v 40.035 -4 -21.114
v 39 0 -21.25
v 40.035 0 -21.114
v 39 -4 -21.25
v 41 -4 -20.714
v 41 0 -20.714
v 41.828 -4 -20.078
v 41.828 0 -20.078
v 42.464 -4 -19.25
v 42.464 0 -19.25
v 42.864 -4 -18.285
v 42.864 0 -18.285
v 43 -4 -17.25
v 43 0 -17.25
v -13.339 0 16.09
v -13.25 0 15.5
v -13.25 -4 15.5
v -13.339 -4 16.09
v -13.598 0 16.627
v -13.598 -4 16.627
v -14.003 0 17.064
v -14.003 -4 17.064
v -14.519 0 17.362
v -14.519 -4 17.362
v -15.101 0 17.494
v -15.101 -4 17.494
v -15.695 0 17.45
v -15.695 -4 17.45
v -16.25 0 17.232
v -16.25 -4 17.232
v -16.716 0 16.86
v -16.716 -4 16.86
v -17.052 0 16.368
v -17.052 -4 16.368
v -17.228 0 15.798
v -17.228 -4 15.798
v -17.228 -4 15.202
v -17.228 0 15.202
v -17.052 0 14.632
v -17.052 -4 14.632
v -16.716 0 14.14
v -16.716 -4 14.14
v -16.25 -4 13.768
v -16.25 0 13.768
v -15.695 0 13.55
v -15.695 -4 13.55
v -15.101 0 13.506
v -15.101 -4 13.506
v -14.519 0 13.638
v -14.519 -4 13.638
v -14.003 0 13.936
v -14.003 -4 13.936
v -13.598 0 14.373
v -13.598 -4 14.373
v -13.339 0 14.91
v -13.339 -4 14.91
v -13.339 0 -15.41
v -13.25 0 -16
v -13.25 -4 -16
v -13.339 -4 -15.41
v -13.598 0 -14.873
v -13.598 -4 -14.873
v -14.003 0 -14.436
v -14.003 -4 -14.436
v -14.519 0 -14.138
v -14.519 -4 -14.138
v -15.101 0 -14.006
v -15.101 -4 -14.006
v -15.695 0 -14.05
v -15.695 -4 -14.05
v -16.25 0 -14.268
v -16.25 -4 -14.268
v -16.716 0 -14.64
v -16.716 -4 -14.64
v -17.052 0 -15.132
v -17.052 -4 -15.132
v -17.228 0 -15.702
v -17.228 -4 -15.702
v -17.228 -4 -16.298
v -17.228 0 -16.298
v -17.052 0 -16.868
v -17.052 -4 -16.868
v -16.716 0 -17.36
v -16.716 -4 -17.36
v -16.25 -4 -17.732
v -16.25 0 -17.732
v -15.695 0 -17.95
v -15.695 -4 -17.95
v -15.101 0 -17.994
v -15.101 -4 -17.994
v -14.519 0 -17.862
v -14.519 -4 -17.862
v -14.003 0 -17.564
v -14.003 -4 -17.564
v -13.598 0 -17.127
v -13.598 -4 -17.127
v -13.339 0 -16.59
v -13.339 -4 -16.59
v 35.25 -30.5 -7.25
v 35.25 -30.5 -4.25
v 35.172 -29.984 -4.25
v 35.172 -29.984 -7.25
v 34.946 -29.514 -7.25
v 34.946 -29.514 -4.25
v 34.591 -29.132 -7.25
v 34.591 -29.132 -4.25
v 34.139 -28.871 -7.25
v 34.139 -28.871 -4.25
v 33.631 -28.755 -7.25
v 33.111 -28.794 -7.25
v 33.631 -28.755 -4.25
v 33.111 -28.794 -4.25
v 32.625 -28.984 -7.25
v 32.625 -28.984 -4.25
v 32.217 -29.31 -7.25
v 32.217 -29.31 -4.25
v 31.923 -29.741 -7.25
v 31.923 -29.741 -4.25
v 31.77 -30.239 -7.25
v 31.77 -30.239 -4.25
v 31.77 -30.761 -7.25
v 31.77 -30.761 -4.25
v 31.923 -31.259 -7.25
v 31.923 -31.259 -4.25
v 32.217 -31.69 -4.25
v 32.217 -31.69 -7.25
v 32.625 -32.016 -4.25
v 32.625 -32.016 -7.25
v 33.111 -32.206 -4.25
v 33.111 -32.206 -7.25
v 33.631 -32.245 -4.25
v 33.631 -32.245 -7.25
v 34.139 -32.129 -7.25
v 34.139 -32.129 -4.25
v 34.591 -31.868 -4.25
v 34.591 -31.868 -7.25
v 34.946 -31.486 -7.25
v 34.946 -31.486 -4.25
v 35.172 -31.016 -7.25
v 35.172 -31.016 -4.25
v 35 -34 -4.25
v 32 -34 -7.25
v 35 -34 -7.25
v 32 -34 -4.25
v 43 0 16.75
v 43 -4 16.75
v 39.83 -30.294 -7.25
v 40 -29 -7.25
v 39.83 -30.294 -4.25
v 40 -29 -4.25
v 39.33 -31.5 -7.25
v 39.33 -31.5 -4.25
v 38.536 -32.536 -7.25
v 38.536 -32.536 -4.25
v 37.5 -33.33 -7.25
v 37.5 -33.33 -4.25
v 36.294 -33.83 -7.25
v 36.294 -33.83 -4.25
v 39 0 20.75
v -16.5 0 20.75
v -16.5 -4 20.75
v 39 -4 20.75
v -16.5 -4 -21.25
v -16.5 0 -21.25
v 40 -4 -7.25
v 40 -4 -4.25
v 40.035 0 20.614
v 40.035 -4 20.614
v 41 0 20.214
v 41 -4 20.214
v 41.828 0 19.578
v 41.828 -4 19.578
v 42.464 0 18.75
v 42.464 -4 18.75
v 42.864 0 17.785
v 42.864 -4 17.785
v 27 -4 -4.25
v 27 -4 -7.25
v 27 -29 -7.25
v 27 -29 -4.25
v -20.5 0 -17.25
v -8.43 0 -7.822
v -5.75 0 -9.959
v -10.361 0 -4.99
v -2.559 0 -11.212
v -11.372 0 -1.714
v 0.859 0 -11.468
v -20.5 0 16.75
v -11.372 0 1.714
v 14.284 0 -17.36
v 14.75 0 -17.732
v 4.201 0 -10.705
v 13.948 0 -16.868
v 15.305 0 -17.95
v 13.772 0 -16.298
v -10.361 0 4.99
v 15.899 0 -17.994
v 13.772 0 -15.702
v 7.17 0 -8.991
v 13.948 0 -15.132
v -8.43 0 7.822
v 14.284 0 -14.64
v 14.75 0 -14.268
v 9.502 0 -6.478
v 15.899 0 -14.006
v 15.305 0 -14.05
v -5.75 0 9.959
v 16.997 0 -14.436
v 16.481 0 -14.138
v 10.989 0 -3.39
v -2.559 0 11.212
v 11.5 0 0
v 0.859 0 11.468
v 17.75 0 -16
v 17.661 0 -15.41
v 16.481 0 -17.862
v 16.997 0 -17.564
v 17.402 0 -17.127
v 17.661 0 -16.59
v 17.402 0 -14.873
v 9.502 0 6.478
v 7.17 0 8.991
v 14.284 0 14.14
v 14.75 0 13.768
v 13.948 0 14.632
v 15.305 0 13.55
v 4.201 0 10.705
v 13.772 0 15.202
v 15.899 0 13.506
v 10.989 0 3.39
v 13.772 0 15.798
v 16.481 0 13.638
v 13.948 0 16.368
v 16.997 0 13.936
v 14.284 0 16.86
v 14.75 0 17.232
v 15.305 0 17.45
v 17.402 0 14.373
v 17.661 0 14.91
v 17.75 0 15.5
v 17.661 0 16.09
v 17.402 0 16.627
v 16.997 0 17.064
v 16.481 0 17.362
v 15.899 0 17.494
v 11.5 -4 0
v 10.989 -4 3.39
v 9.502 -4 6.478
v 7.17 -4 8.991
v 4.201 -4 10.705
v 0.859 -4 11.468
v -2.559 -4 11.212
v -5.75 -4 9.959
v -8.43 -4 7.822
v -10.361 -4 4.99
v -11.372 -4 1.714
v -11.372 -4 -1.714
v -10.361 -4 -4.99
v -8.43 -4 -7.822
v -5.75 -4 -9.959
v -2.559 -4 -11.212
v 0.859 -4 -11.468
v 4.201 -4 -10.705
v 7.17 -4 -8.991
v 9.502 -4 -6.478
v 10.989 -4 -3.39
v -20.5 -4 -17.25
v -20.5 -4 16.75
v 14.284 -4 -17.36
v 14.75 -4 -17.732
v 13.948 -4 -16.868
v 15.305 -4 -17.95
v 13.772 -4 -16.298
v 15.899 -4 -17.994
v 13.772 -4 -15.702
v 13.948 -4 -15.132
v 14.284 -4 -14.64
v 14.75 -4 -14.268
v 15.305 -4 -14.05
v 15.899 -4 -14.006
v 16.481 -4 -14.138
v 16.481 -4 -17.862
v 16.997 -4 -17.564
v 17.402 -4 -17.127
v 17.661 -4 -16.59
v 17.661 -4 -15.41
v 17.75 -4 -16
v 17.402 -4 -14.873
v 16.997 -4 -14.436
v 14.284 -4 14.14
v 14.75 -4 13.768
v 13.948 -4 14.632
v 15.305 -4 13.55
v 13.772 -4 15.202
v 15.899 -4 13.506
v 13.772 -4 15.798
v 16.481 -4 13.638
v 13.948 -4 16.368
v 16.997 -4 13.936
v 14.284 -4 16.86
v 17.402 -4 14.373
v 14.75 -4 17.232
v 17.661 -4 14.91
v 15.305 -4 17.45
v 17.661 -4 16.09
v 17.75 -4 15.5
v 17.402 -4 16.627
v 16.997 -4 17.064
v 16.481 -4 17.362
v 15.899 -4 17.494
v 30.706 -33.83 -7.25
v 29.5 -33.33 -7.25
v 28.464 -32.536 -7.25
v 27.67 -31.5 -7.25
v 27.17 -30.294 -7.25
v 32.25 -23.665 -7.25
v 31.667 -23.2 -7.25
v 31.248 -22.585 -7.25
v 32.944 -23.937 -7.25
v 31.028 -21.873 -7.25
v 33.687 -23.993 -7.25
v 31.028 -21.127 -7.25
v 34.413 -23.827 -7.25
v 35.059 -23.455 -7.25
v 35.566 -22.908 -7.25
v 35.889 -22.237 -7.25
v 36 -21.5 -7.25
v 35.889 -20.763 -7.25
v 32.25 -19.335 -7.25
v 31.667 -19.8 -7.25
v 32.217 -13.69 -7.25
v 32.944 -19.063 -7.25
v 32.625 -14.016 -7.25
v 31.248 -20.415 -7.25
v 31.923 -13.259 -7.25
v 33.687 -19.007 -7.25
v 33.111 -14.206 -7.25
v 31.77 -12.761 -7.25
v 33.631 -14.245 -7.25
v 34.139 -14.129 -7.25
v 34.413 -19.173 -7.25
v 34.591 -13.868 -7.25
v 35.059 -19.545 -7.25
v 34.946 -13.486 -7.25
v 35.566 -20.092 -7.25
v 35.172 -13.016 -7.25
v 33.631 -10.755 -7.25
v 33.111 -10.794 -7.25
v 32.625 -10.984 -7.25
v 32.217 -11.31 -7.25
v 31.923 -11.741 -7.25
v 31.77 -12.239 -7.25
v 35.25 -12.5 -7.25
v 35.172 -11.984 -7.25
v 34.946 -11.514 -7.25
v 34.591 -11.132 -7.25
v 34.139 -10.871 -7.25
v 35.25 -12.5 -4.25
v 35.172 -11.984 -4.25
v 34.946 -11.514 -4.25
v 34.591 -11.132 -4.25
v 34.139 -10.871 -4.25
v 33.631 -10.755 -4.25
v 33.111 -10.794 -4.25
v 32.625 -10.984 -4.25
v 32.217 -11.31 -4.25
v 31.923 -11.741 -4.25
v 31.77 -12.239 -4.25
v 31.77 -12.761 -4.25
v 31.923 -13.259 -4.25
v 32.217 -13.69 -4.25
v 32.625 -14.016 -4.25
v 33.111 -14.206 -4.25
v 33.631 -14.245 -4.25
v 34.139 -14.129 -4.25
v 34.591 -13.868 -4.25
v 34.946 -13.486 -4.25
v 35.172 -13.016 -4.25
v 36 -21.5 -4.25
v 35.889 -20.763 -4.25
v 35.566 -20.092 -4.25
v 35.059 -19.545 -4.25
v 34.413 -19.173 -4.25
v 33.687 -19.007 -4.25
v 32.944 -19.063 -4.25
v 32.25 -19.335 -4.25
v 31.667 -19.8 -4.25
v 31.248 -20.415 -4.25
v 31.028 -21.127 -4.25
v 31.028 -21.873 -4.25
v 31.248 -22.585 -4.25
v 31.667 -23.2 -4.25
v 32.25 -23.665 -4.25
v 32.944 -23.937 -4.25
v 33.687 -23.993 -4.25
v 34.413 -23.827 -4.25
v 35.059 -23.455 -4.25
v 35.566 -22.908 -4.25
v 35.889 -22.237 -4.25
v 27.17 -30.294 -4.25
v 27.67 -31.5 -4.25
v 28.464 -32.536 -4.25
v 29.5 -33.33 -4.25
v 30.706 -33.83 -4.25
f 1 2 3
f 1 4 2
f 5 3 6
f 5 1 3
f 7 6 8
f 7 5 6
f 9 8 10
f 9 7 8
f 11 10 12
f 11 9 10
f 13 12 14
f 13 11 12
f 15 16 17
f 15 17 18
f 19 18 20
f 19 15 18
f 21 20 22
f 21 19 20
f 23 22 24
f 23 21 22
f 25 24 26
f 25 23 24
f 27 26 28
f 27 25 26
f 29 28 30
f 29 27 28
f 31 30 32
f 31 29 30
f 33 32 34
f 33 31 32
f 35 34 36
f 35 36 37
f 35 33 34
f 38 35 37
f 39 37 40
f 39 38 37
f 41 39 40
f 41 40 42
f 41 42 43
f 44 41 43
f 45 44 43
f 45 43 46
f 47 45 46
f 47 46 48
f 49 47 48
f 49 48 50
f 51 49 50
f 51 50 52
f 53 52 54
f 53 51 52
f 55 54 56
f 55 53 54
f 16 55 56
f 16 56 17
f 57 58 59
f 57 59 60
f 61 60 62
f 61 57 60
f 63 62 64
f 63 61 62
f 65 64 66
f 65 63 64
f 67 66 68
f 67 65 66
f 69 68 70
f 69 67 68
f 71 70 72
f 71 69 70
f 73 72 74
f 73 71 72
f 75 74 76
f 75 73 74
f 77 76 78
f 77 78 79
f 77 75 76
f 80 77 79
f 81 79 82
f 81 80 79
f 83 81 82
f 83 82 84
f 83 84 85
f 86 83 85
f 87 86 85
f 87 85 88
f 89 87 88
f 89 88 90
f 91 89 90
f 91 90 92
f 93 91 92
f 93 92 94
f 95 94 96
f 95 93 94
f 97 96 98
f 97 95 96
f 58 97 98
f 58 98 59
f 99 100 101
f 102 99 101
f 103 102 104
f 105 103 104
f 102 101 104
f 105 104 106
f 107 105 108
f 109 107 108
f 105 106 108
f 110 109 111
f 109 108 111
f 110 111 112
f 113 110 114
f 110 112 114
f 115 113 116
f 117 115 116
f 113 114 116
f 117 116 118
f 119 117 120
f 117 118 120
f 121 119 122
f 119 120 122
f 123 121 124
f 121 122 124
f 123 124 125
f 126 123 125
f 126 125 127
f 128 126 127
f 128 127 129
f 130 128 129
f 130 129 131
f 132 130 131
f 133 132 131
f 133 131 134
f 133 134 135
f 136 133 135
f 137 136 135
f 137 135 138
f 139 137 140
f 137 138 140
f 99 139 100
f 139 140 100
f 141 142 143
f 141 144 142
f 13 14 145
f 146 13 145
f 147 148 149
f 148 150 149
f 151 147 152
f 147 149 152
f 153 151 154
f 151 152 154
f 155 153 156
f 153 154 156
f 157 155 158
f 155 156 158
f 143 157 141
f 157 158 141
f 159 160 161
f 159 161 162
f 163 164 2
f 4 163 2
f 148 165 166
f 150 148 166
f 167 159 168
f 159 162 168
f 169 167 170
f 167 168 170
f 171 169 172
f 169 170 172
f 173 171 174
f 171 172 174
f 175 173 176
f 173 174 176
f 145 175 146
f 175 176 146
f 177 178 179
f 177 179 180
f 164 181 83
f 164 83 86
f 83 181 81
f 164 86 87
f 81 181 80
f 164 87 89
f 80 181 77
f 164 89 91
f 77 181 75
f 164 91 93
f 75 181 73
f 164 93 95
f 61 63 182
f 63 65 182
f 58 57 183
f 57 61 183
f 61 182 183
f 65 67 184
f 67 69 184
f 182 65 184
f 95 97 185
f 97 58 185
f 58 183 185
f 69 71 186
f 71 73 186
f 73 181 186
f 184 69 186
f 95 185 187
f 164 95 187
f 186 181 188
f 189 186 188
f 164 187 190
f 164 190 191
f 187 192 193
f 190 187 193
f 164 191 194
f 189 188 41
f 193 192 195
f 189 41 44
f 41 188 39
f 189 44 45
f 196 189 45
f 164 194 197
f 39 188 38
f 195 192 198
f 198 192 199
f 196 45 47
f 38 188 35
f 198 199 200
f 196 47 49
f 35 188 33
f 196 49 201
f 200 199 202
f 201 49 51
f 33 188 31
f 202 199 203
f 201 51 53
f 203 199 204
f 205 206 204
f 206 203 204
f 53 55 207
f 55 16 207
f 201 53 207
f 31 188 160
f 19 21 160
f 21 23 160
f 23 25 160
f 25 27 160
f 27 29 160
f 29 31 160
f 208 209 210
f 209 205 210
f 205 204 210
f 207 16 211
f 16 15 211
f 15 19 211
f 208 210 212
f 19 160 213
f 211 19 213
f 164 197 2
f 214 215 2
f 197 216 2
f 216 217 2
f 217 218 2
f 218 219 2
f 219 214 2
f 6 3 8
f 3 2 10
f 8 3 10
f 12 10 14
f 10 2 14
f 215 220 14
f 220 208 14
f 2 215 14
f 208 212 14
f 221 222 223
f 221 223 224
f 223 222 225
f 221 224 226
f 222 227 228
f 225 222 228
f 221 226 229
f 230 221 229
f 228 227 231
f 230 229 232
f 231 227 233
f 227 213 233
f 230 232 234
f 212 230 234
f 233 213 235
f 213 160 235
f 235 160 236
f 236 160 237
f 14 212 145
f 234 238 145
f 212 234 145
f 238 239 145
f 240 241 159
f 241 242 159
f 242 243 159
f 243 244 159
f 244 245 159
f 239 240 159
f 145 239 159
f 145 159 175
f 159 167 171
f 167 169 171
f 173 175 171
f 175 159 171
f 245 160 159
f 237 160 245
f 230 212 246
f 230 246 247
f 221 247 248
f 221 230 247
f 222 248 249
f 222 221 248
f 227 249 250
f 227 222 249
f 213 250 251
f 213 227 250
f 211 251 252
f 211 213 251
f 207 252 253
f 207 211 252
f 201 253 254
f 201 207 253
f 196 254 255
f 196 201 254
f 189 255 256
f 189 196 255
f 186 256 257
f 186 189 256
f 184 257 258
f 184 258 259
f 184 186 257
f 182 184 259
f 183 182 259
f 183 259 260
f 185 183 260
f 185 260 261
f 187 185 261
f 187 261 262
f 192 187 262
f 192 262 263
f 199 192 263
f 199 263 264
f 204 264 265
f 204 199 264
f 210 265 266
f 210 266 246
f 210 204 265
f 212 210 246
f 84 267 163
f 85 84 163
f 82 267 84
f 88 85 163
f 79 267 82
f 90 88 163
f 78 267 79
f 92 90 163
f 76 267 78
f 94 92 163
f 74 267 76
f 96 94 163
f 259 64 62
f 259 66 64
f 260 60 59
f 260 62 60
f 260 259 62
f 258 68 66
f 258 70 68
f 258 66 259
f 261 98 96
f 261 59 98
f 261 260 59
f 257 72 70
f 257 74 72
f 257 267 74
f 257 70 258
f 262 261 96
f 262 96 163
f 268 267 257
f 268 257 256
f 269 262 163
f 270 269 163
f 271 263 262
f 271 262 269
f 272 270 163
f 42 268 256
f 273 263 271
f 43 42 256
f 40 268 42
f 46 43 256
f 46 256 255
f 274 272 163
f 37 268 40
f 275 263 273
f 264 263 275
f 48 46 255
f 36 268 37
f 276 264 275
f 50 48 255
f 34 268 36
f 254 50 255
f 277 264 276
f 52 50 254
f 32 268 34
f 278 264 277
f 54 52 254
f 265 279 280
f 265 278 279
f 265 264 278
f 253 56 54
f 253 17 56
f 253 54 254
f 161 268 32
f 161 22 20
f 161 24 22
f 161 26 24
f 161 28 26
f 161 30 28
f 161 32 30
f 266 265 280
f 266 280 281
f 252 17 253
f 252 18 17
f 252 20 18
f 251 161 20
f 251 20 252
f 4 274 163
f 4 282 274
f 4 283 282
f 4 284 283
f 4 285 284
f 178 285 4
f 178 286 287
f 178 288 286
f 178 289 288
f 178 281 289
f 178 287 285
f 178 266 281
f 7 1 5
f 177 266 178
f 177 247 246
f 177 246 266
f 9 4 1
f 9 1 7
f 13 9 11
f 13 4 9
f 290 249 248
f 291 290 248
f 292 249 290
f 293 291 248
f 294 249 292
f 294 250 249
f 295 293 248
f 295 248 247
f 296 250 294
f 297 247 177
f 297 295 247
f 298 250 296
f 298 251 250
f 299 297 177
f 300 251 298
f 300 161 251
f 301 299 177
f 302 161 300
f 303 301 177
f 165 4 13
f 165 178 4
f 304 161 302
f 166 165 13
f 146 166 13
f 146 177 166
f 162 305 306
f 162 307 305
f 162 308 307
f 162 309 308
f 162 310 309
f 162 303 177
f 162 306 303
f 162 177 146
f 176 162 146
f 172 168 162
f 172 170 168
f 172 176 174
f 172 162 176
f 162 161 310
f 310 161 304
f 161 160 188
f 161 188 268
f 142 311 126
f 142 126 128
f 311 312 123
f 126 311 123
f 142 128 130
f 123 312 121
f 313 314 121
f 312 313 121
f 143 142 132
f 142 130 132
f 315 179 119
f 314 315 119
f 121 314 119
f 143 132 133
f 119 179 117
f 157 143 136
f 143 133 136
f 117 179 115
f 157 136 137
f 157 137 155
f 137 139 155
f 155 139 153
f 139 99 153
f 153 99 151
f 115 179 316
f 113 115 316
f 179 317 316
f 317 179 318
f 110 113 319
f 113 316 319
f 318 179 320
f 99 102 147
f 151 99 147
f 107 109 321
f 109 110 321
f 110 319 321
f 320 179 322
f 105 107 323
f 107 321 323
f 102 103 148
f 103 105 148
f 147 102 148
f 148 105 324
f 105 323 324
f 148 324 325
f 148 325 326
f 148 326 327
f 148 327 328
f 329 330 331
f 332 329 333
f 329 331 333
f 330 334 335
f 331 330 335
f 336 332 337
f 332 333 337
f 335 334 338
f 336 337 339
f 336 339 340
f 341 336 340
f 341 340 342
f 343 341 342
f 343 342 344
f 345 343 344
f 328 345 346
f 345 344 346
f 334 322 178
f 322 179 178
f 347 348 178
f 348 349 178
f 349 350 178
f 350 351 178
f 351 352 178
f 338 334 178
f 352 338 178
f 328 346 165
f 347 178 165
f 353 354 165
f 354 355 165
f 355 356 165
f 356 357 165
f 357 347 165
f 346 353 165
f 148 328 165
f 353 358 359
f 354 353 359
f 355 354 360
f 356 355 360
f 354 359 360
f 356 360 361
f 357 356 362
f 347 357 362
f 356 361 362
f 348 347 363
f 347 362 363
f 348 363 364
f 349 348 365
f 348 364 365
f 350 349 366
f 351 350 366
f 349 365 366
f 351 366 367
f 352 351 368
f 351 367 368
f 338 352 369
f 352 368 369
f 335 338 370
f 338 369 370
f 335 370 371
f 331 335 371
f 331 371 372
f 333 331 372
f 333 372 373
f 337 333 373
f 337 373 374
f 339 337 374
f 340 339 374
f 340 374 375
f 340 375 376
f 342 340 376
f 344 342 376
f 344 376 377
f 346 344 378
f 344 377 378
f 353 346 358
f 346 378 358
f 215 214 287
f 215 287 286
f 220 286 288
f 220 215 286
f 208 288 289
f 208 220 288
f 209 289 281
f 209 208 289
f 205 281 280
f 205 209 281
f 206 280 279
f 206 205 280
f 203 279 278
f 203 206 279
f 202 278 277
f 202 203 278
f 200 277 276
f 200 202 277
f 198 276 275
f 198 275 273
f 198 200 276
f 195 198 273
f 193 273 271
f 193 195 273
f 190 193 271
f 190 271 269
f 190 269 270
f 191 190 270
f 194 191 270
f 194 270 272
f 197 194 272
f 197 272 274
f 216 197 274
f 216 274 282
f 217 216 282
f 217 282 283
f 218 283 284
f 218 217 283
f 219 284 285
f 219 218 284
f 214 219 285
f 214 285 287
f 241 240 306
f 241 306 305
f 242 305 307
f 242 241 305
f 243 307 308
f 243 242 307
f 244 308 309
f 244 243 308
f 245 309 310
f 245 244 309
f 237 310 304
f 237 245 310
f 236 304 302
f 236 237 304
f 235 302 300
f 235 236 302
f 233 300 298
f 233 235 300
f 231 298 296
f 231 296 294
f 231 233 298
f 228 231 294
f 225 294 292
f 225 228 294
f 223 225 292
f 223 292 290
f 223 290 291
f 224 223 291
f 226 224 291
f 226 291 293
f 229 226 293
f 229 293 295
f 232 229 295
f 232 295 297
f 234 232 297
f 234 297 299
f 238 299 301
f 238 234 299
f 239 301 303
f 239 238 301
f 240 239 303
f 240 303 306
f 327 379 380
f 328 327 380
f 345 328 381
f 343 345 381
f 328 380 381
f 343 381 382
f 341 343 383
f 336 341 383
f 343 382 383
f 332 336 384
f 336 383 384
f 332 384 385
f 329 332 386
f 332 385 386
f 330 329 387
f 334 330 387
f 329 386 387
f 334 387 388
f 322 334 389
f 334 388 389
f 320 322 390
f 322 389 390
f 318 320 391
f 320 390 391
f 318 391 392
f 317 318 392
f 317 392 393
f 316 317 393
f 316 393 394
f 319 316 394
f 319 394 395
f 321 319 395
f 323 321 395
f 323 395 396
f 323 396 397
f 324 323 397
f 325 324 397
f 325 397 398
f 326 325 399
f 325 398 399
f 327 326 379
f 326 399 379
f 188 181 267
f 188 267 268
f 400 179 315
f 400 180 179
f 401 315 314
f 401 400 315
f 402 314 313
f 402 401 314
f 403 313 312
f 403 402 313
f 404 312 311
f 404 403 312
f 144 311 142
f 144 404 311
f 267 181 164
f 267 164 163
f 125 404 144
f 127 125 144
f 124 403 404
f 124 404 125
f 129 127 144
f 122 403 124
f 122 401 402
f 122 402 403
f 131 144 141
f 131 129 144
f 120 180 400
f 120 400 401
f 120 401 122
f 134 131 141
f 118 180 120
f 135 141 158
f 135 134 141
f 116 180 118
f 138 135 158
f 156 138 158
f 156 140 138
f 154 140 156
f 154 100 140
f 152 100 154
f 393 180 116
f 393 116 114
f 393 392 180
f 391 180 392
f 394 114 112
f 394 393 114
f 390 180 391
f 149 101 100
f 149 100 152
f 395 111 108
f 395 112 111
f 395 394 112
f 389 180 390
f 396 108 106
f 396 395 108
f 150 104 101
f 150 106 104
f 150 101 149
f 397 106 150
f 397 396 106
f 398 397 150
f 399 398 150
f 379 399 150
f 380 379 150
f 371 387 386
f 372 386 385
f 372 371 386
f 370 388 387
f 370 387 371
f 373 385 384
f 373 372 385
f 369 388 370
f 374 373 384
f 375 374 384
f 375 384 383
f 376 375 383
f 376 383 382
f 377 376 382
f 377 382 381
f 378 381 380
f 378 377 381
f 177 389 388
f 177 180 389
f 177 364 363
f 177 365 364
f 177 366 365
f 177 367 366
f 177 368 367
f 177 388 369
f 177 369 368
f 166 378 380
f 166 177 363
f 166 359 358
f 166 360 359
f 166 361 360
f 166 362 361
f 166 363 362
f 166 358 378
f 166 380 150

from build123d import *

# Parameters (mm, degrees)
F0_W     = 63.5
F0_H     = 42
F0_R     = 2
F0_R_2   = 11.5
F1_DEPTH = 4
F2_SIZE  = 4
F3_W     = 13
F3_H     = 3
F4_DEPTH = 30
F5_R     = 5
F6_R     = 4
F7_R     = 2.5
F7_R_2   = 1.75
F8_DEPTH = 3


with BuildPart() as f1:
    # F0 (on Front) → F1 (new body)
    with BuildSketch(Plane.XZ):
        with Locations((11.25, -0.25)):
            Rectangle(F0_W, F0_H)
        with Locations((-15.25, -16)):
            Circle(F0_R, mode=Mode.SUBTRACT)
        with Locations((15.75, -16)):
            Circle(F0_R, mode=Mode.SUBTRACT)
        Circle(F0_R_2, mode=Mode.SUBTRACT)
        with Locations((-15.25, 15.5)):
            Circle(F0_R, mode=Mode.SUBTRACT)
        with Locations((15.75, 15.5)):
            Circle(F0_R, mode=Mode.SUBTRACT)
    extrude(amount=F1_DEPTH)

    # F2
    f2_edges = [f1.edges().sort_by_distance(p)[0] for p in [
        (-20.5, -2, -21.25),
        (-20.5, -2, 20.75),
    ]]
    chamfer(f2_edges, length=F2_SIZE)

    # F3 (on face) → F4 (join)
    with BuildSketch(Plane.XZ.offset(4)):
        with Locations((33.5, -5.75)):
            Rectangle(F3_W, F3_H)
    extrude(amount=F4_DEPTH)

    # F5
    f5_edges = [f1.edges().sort_by_distance(p)[0] for p in [
        (40, -34, -5.75),
        (27, -34, -5.75),
    ]]
    fillet(f5_edges, radius=F5_R)

    # F6
    f6_edges = [f1.edges().sort_by_distance(p)[0] for p in [
        (43, -2, 20.75),
        (43, -2, -21.25),
    ]]
    fillet(f6_edges, radius=F6_R)

    # F7 (on face) → F8 (cut, through all)
    with BuildSketch(Plane.XY.offset(-4.25)):
        with Locations((33.5, -21.5)):
            Circle(F7_R)
        with Locations((33.5, -30.5)):
            Circle(F7_R_2)
        with Locations((33.5, -12.5)):
            Circle(F7_R_2)
    extrude(amount=-F8_DEPTH, mode=Mode.SUBTRACT)


solid = f1.part
